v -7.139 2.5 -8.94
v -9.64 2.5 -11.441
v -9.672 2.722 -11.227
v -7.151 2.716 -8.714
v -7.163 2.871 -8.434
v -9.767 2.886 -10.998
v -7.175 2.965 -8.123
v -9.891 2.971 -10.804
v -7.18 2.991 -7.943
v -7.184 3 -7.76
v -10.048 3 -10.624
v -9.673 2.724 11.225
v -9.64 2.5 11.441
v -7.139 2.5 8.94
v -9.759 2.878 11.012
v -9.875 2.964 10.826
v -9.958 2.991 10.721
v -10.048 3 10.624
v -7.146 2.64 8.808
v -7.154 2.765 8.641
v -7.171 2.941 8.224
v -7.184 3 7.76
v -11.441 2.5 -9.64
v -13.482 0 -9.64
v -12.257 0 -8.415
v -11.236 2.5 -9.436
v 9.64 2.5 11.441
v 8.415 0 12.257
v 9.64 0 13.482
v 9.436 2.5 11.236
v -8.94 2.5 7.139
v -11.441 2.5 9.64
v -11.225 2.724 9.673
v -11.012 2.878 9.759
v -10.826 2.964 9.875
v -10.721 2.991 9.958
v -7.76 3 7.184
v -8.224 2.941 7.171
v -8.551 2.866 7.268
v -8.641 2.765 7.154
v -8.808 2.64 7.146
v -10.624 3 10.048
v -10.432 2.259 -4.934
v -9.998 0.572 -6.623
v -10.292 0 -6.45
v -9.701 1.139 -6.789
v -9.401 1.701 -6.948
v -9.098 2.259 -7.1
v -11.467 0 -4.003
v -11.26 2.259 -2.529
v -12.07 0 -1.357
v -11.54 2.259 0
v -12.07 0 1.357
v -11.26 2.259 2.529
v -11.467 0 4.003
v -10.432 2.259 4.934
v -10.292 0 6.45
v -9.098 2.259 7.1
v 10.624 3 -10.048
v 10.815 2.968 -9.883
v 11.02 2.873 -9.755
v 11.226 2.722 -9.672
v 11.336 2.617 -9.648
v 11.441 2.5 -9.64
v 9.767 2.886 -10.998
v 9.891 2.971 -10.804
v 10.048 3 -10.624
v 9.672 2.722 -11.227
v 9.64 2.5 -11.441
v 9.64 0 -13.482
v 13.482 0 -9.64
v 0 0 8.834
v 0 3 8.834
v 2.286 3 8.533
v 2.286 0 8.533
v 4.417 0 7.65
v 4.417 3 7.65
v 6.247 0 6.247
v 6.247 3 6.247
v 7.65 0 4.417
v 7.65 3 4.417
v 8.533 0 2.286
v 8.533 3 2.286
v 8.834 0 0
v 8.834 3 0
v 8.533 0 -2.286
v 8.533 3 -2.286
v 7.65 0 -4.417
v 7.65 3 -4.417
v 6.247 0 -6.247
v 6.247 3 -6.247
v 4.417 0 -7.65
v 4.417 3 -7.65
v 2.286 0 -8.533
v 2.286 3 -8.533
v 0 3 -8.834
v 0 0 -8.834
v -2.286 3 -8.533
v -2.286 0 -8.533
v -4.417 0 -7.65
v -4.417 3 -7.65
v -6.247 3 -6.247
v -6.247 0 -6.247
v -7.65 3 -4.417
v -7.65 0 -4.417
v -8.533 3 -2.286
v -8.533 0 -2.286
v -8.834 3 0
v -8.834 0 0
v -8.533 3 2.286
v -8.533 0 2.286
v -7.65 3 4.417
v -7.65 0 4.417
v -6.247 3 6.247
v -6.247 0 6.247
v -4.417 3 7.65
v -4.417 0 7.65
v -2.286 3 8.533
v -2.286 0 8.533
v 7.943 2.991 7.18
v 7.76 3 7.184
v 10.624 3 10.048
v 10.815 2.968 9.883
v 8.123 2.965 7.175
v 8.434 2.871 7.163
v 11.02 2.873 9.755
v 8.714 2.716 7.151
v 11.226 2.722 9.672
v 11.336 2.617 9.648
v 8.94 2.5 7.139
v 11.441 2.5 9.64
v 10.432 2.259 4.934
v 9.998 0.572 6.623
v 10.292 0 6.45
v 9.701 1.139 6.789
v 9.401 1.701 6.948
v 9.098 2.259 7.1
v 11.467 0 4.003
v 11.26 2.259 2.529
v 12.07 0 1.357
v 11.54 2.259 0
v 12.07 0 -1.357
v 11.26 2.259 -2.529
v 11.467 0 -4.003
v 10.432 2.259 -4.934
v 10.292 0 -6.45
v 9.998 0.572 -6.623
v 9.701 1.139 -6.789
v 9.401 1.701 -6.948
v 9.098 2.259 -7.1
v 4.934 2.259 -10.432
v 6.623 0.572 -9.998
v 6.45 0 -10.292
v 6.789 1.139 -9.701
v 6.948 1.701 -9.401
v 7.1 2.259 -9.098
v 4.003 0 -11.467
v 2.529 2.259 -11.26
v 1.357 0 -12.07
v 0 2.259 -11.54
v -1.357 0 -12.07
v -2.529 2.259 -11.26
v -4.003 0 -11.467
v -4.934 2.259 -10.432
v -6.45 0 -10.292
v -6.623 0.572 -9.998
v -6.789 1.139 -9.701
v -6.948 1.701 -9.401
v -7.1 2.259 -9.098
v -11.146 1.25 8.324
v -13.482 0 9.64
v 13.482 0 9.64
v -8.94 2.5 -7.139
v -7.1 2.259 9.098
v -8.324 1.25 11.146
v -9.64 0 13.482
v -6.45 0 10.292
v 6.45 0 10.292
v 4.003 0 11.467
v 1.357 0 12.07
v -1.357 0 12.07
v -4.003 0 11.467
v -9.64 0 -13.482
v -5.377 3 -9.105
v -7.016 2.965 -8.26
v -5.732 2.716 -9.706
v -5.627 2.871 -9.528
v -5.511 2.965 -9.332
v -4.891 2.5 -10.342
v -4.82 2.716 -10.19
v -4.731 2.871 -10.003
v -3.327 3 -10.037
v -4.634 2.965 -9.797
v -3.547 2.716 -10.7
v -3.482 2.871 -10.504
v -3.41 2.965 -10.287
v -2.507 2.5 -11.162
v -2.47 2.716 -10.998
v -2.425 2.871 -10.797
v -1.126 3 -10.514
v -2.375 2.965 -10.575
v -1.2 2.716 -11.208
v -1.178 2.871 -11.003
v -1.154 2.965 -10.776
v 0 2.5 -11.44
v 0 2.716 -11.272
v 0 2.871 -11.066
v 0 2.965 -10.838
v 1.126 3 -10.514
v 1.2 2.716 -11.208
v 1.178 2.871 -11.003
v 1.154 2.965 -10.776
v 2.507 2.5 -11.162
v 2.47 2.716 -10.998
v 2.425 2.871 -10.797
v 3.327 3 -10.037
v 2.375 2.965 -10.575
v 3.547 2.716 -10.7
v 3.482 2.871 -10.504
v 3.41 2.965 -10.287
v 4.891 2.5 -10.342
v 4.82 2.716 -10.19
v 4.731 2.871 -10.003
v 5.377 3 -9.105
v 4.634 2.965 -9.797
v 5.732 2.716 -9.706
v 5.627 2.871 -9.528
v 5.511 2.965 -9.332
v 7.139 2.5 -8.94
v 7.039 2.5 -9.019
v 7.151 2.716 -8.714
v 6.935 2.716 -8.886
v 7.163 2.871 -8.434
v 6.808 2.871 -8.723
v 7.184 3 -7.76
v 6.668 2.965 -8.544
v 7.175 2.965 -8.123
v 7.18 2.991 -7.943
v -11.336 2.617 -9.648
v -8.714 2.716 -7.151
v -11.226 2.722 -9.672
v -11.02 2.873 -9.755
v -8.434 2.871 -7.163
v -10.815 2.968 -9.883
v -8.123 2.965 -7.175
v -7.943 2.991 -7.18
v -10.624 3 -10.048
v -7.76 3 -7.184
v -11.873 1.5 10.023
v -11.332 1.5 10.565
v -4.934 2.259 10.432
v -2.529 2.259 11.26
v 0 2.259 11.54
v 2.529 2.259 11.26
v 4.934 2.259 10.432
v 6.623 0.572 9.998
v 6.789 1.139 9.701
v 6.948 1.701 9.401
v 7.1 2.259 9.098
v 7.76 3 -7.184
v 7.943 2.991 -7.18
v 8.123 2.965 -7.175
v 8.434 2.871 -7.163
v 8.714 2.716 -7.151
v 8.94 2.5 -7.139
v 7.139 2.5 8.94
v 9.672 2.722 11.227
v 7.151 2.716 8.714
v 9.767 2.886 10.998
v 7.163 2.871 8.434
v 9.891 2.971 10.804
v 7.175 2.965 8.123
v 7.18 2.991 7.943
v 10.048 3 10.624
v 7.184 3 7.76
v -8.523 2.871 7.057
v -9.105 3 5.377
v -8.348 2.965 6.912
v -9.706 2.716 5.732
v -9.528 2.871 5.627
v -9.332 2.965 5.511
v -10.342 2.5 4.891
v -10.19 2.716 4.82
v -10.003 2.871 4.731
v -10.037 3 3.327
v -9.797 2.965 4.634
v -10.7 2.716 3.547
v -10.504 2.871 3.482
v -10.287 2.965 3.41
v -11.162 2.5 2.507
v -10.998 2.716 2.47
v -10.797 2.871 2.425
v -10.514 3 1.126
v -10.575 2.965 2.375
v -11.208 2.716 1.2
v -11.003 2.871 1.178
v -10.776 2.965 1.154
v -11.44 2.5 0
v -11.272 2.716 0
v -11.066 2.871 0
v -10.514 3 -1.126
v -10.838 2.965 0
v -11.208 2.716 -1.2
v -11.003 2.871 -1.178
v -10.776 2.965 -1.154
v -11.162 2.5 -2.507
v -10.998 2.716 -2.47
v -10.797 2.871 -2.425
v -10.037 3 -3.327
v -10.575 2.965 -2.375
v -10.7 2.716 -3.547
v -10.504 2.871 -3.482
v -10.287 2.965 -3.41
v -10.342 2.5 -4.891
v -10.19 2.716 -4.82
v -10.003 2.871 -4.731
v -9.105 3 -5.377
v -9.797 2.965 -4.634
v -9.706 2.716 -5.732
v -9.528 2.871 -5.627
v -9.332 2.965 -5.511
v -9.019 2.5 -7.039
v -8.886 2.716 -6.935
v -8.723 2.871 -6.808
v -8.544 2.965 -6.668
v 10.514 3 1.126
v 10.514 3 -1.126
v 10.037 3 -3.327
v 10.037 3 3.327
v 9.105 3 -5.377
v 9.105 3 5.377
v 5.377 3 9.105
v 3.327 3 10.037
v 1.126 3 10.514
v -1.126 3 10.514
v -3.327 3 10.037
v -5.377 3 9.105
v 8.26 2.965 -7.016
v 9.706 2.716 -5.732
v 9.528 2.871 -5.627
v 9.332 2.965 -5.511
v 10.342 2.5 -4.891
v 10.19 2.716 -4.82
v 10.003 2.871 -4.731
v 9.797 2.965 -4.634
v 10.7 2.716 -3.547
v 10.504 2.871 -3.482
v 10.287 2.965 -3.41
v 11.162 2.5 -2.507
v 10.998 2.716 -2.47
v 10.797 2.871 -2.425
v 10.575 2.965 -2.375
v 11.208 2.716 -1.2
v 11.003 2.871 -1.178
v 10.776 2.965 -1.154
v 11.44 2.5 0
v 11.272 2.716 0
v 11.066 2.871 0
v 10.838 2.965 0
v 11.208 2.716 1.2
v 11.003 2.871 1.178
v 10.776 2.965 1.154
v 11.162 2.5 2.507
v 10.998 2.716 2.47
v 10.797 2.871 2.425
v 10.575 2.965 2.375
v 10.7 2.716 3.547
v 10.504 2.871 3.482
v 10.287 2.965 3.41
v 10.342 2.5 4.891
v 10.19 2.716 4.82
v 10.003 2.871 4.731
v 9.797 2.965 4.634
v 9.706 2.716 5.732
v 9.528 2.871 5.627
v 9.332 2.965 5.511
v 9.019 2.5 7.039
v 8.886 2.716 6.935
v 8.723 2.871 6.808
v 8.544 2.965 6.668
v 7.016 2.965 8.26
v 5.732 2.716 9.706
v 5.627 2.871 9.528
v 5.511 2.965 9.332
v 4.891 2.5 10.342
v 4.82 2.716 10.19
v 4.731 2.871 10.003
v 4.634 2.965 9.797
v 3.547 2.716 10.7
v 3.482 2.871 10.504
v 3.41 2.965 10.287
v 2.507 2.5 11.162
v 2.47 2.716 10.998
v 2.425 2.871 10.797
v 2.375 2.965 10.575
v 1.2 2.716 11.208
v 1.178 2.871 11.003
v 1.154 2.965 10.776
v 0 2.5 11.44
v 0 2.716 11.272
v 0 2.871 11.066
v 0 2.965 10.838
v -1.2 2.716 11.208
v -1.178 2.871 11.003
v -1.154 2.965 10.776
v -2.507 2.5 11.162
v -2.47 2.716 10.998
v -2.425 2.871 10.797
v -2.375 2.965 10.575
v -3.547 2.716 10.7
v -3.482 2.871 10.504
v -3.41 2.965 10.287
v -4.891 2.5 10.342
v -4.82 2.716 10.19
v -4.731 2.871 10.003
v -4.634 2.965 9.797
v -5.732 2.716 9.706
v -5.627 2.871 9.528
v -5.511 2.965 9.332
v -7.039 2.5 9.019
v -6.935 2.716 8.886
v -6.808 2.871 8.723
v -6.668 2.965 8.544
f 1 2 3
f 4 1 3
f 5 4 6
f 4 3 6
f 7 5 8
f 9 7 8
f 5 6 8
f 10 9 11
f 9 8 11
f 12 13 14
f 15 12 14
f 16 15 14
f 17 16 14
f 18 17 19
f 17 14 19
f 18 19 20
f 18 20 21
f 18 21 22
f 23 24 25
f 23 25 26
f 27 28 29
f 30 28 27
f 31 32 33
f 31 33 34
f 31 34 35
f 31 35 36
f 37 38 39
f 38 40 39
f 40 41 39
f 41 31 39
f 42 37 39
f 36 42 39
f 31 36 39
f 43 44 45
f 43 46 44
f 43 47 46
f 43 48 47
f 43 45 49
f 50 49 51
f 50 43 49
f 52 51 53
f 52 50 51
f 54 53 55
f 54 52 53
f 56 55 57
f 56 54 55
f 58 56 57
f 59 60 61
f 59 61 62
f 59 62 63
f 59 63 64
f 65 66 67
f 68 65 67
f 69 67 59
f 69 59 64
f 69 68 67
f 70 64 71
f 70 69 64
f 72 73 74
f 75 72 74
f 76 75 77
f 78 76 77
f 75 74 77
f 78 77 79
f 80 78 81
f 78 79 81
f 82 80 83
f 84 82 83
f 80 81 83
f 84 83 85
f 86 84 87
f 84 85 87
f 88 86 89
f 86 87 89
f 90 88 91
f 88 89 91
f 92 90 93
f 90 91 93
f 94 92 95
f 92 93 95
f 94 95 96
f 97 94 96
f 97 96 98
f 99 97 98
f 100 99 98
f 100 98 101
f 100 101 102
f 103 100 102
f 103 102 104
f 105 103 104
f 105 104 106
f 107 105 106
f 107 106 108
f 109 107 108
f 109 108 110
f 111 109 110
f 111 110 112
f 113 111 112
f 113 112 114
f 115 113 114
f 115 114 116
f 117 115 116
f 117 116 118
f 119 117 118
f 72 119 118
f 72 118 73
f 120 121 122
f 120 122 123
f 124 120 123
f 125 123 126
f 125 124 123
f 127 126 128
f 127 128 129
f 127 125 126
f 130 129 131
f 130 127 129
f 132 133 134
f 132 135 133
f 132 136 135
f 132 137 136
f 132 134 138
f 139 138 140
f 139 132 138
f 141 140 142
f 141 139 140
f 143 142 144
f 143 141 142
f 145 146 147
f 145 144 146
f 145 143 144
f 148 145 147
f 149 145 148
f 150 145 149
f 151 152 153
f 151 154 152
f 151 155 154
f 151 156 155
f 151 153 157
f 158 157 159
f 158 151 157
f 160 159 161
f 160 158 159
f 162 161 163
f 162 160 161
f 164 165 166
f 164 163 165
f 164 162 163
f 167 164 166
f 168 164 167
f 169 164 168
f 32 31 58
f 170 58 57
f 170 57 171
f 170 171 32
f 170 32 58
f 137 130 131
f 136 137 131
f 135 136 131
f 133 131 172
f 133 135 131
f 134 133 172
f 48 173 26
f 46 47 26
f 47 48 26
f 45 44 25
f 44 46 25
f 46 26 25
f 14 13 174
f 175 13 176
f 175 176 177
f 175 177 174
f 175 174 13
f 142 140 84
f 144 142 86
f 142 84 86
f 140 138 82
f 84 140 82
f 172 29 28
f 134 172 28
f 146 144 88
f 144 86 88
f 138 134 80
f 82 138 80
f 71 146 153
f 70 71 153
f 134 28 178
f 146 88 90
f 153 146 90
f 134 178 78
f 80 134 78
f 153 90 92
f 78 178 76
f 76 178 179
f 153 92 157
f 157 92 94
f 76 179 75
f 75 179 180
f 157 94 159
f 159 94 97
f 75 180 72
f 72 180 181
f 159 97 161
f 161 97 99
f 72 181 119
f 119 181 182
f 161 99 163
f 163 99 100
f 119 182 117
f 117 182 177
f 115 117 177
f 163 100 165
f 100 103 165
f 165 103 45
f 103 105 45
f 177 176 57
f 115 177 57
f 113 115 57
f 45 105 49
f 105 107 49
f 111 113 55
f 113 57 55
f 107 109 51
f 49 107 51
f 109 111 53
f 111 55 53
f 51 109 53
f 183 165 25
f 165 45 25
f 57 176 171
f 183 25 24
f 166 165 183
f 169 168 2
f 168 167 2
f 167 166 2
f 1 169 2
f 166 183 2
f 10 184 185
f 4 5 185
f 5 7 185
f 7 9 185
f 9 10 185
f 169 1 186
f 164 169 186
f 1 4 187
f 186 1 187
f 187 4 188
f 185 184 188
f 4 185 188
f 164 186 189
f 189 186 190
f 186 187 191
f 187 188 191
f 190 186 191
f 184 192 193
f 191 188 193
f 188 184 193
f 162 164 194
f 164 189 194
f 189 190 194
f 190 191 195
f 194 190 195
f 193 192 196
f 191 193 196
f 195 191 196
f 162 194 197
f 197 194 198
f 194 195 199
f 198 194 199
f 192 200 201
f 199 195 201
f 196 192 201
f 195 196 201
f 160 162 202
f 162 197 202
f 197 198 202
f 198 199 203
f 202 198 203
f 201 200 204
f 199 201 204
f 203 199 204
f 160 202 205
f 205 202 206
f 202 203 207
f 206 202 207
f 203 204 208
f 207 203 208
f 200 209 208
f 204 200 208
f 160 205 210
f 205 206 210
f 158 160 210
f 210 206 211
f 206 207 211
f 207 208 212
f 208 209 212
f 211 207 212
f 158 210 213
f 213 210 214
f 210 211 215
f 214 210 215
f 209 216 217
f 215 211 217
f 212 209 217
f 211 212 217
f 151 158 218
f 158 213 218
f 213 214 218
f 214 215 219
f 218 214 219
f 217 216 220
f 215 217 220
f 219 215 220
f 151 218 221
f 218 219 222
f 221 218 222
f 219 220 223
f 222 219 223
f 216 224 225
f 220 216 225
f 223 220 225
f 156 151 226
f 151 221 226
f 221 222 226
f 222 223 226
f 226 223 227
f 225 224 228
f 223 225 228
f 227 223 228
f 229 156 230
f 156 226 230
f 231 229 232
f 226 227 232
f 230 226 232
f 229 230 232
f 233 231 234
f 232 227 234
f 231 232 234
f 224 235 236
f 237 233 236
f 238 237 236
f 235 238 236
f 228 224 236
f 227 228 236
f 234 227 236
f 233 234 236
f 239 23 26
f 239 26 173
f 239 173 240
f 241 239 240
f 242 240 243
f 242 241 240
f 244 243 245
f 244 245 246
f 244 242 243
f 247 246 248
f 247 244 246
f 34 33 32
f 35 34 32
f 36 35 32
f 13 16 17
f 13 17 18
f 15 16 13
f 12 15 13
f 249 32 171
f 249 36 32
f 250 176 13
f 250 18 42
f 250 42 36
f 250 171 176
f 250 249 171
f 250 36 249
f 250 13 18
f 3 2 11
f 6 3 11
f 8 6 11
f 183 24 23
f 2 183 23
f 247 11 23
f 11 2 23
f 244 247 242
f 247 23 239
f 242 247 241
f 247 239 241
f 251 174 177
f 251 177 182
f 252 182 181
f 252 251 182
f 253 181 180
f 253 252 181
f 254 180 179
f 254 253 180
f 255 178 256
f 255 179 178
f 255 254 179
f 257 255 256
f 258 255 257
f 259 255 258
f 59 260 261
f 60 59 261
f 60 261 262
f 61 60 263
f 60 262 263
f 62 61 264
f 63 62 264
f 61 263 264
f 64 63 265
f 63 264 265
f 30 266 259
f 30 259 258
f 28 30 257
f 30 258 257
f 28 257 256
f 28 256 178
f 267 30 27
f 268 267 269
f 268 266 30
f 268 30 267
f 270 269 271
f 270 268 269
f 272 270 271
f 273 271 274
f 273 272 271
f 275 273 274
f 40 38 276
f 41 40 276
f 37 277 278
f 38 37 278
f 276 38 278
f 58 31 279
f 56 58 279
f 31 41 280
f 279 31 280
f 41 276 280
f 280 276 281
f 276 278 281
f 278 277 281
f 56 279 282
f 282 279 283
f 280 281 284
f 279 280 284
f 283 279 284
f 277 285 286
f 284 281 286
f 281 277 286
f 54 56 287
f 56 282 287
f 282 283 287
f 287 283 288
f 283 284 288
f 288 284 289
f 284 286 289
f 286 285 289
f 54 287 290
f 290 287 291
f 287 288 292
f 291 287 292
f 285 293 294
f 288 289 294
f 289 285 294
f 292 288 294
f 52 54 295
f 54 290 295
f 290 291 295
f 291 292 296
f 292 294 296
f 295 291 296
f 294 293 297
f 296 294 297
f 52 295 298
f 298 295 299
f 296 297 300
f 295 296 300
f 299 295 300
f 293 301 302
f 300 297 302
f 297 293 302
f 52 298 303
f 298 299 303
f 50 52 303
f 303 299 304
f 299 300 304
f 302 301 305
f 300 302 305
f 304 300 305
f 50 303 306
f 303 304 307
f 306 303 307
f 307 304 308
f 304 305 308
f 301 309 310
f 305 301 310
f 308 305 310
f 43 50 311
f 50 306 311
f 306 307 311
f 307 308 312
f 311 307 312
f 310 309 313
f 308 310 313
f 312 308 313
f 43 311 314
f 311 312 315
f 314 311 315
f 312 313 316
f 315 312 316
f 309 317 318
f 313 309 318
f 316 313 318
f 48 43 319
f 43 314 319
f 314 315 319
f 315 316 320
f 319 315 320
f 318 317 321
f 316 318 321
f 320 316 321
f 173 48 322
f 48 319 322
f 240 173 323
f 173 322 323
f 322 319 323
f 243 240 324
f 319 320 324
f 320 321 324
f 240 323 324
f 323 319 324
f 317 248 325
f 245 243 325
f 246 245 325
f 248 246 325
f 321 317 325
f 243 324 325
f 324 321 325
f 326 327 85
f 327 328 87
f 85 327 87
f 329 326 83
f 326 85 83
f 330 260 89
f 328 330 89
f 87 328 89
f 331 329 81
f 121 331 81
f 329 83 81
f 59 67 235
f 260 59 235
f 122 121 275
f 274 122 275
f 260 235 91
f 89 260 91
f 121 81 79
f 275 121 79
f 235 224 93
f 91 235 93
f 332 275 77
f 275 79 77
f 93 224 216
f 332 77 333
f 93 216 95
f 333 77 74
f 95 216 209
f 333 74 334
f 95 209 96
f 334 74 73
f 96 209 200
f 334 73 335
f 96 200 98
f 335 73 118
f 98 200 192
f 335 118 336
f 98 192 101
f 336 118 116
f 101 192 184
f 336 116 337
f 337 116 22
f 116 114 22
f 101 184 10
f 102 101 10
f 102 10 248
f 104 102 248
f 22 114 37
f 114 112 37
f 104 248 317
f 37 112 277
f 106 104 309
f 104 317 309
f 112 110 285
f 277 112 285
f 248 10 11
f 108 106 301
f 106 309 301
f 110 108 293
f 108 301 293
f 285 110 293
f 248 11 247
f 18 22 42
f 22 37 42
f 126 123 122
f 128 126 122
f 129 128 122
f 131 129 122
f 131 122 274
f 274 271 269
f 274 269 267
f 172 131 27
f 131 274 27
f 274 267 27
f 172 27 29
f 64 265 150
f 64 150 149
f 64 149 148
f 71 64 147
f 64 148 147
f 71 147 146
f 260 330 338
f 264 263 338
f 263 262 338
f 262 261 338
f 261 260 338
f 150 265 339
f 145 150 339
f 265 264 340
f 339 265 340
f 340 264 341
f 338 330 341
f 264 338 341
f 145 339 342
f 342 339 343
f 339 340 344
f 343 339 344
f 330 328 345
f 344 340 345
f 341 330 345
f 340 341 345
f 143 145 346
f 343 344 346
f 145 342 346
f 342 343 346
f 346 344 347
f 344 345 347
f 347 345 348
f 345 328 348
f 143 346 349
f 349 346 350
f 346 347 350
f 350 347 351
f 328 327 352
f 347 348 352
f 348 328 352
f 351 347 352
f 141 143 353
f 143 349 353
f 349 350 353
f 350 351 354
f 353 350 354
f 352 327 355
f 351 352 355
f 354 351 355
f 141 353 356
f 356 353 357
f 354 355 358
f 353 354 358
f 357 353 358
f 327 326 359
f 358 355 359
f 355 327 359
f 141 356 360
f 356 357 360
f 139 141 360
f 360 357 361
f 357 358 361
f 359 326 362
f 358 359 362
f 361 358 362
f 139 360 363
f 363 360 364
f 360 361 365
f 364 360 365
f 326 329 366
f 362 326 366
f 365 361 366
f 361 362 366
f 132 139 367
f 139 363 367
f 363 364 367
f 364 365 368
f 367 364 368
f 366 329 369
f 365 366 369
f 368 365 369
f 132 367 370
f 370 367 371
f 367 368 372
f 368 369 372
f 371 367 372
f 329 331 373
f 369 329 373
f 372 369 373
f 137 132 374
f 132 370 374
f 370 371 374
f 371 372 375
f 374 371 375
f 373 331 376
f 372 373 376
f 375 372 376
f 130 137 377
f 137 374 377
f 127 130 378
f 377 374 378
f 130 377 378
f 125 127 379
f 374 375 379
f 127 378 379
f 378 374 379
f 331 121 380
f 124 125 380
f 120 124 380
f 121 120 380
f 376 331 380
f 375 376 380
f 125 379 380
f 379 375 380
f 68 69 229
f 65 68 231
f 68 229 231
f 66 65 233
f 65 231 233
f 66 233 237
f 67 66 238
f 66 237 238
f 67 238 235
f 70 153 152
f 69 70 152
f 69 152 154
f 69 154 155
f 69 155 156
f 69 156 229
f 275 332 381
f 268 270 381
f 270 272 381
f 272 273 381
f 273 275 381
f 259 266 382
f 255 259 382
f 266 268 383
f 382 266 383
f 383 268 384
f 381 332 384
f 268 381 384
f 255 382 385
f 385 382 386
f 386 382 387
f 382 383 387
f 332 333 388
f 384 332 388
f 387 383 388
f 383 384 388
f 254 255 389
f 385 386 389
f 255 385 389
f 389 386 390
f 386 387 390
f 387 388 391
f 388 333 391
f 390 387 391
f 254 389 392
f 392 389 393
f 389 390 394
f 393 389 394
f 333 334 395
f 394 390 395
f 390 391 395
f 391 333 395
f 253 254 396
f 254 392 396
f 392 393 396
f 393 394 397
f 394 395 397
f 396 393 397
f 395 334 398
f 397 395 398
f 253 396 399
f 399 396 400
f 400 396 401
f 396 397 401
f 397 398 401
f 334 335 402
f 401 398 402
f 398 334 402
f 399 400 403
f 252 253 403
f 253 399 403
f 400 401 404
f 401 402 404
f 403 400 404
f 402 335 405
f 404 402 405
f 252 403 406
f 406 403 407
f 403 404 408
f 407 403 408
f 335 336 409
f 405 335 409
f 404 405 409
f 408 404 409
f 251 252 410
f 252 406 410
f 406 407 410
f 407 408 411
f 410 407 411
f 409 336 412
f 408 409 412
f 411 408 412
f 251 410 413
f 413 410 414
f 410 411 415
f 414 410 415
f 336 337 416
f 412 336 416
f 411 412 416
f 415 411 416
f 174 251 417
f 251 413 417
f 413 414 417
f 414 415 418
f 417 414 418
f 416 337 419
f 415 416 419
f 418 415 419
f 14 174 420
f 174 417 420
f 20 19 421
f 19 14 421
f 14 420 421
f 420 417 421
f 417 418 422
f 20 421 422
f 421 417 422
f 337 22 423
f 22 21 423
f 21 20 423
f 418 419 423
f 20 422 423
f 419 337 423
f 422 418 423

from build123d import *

# Parameters (mm, degrees)
SKETCH2_R           = 12.145554975
BOSS_EXTRUDE1_DEPTH = 3
BOSS_EXTRUDE1_TAPER = 15
BOSS_EXTRUDE2_DEPTH = 3
BOSS_EXTRUDE2_TAPER = 30
FILLET1_R           = 1
CIRPATTERN2_START   = -14.617361382
CIRPATTERN2_DEPTH   = 29.234722764
CIRPATTERN2_START_2 = -0.407249855
CIRPATTERN2_2_DEPTH = 0.81449971
CIRPATTERN2_START_3 = 2.716651032
CIRPATTERN2_3_DEPTH = 13.632761157
CIRPATTERN2_START_4 = -2.716651132
CIRPATTERN2_4_DEPTH = 5.433302164
CIRPATTERN2_START_5 = -11.369329343
CIRPATTERN2_5_DEPTH = 22.738655401
CIRPATTERN2_START_6 = -17
CIRPATTERN2_6_DEPTH = 2.382638618
CIRPATTERN2_START_7 = 14.617361382
CIRPATTERN2_7_DEPTH = 2.382638618
SKETCH4_R           = 8.834020379
CUT_EXTRUDE1_DEPTH  = 20.300641771


with BuildPart() as part:
    # Sketch2 → Boss-Extrude1 (new body)
    with BuildSketch(Plane(origin=(0, 0, 0), x_dir=(1, 0, 0), z_dir=(0, 1, 0))):
        Circle(SKETCH2_R)
    extrude(amount=BOSS_EXTRUDE1_DEPTH, taper=BOSS_EXTRUDE1_TAPER)

    # Sketch3 → Boss-Extrude2 (add)
    with BuildSketch(Plane(origin=(0, 0, 0), x_dir=(1, 0, 0), z_dir=(0, 1, 0))):
        Polygon((-7.65848972, -3.816564986), (-13.481742595, -9.639817861), (-9.639817861, -13.481742595), (-3.816564986, -7.65848972), align=None)
    extrude(amount=BOSS_EXTRUDE2_DEPTH, taper=BOSS_EXTRUDE2_TAPER)

    # Fillet1
    fillet1_edges = [part.edges().sort_by_distance(p)[0] for p in [
        (-8.466560643, 3, 9.858995634),
        (-9.858995634, 3, 8.466560643),
        (-3.880929208, 3, -10.657050022),
    ]]
    fillet(fillet1_edges, radius=FILLET1_R)

    # CirPattern2: read off the stored shape, not the designer's step
    # CirPattern2 outline → CirPattern2 (add)
    with BuildSketch(Plane(origin=(0, 0, 0), x_dir=(0.707106781186545, 0, -0.70710678118655), z_dir=(0.70710678118655, 0, 0.707106781186545)).offset(CIRPATTERN2_START)):
        with BuildLine():
            ThreePointArc((1.273275359, 2.5), (0.907249955, 2.866025404), (0.407249955, 3))
            Line((0.407249955, 3), (-0.407249955, 3))
            ThreePointArc((-0.407249955, 3), (-0.907249955, 2.866025404), (-1.273275359, 2.5))
            Line((-1.273275359, 2.5), (-2.716651032, 0))
            Line((-2.716651032, 0), (2.716651032, 0))
            Line((2.716651032, 0), (1.273275359, 2.5))
        make_face()
    extrude(amount=CIRPATTERN2_DEPTH)

    # CirPattern2 2 outline → CirPattern2 2 (add)
    with BuildSketch(Plane(origin=(0, 0, 0), x_dir=(0.707106781186545, 0, -0.70710678118655), z_dir=(0.70710678118655, 0, 0.707106781186545)).offset(CIRPATTERN2_START_2)):
        with BuildLine():
            Line((16.349412189, 0), (14.617361382, 3))
            Line((14.617361382, 3), (0.407249955, 3))
            ThreePointArc((0.407249955, 3), (0.907249955, 2.866025404), (1.273275359, 2.5))
            Line((1.273275359, 2.5), (2.716651032, 0))
            Line((2.716651032, 0), (16.349412189, 0))
        make_face()
    extrude(amount=CIRPATTERN2_2_DEPTH)

    # CirPattern2 3 outline → CirPattern2 3 (add)
    with BuildSketch(Plane(origin=(0, 0, 0), x_dir=(0.707106781186548, 0, 0.707106781186547), z_dir=(0.707106781186547, 0, -0.707106781186548)).offset(CIRPATTERN2_START_3)):
        with BuildLine():
            Line((2.716651032, 0), (0.407249855, 0))
            Line((0.407249855, 0), (0.407249955, -3))
            ThreePointArc((0.407249955, -3), (0.907249955, -2.866025404), (1.273275359, -2.5))
            Line((1.273275359, -2.5), (2.716651032, 0))
        make_face()
        with BuildLine():
            Line((-0.407249855, 0), (-2.716651032, 0))
            Line((-2.716651032, 0), (-1.273275359, -2.5))
            ThreePointArc((-1.273275359, -2.5), (-0.907249955, -2.866025404), (-0.407249955, -3))
            Line((-0.407249955, -3), (-0.407249855, 0))
        make_face()
    extrude(amount=CIRPATTERN2_3_DEPTH)

    # CirPattern2 4 outline → CirPattern2 4 (add)
    with BuildSketch(Plane(origin=(0, 0, 0), x_dir=(0.707106781186548, 0, 0.707106781186547), z_dir=(0.707106781186547, 0, -0.707106781186548)).offset(CIRPATTERN2_START_4)):
        Polygon((16.349412189, 0), (14.617361382, 0), (14.617361382, -3), align=None)
        Polygon((-14.617361382, 0), (-16.349412189, 0), (-14.617361382, -3), align=None)
    extrude(amount=CIRPATTERN2_4_DEPTH)

    # CirPattern2 5 outline → CirPattern2 5 (cut)
    with BuildSketch(Plane(origin=(0, 0, 0), x_dir=(0.7071067811865451, 0, -0.7071067811865499), z_dir=(0.7071067811865498, 0, 0.7071067811865454)).offset(CIRPATTERN2_START_5)):
        Polygon((14.617361382, 3), (16.349412189, 0), (16.349412189, 3), align=None)
    extrude(amount=CIRPATTERN2_5_DEPTH, mode=Mode.SUBTRACT)

    # CirPattern2 6 outline → CirPattern2 6 (cut)
    with BuildSketch(Plane(origin=(0, 0, 0), x_dir=(0.7071067811865451, 0, -0.7071067811865499), z_dir=(0.7071067811865498, 0, 0.7071067811865454)).offset(CIRPATTERN2_START_6)):
        with BuildLine():
            Line((-0.407249955, 3), (-2.716651132, 3))
            Line((-2.716651132, 3), (-2.716651132, 0))
            Line((-2.716651132, 0), (-1.273275359, 2.5))
            ThreePointArc((-1.273275359, 2.5), (-0.907249955, 2.866025404), (-0.407249955, 3))
        make_face()
        with BuildLine():
            Line((2.716651032, 3), (0.407249955, 3))
            ThreePointArc((0.407249955, 3), (0.907249955, 2.866025404), (1.273275359, 2.5))
            Line((1.273275359, 2.5), (2.716651032, 0))
            Line((2.716651032, 0), (2.716651032, 3))
        make_face()
    extrude(amount=CIRPATTERN2_6_DEPTH, mode=Mode.SUBTRACT)

    # CirPattern2 7 outline → CirPattern2 7 (cut)
    with BuildSketch(Plane(origin=(0, 0, 0), x_dir=(0.7071067811865451, 0, -0.7071067811865499), z_dir=(0.7071067811865498, 0, 0.7071067811865454)).offset(CIRPATTERN2_START_7)):
        with BuildLine():
            Line((-0.407249955, 3), (-2.716651132, 3))
            Line((-2.716651132, 3), (-2.716651132, 0))
            Line((-2.716651132, 0), (-1.273275359, 2.5))
            ThreePointArc((-1.273275359, 2.5), (-0.907249955, 2.866025404), (-0.407249955, 3))
        make_face()
        with BuildLine():
            Line((2.716651032, 3), (0.407249955, 3))
            ThreePointArc((0.407249955, 3), (0.907249955, 2.866025404), (1.273275359, 2.5))
            Line((1.273275359, 2.5), (2.716651032, 0))
            Line((2.716651032, 0), (2.716651032, 3))
        make_face()
    extrude(amount=CIRPATTERN2_7_DEPTH, mode=Mode.SUBTRACT)

    # Sketch4 → Cut-Extrude1 (cut, through all)
    with BuildSketch(Plane(origin=(0, 3, 0), x_dir=(1, 0, 0), z_dir=(0, 1, 0))):
        with Locations(Location((0, 0, 0), (0, 0, 270))):
            Circle(SKETCH4_R)
    extrude(amount=-CUT_EXTRUDE1_DEPTH, mode=Mode.SUBTRACT)


solid = part.part
